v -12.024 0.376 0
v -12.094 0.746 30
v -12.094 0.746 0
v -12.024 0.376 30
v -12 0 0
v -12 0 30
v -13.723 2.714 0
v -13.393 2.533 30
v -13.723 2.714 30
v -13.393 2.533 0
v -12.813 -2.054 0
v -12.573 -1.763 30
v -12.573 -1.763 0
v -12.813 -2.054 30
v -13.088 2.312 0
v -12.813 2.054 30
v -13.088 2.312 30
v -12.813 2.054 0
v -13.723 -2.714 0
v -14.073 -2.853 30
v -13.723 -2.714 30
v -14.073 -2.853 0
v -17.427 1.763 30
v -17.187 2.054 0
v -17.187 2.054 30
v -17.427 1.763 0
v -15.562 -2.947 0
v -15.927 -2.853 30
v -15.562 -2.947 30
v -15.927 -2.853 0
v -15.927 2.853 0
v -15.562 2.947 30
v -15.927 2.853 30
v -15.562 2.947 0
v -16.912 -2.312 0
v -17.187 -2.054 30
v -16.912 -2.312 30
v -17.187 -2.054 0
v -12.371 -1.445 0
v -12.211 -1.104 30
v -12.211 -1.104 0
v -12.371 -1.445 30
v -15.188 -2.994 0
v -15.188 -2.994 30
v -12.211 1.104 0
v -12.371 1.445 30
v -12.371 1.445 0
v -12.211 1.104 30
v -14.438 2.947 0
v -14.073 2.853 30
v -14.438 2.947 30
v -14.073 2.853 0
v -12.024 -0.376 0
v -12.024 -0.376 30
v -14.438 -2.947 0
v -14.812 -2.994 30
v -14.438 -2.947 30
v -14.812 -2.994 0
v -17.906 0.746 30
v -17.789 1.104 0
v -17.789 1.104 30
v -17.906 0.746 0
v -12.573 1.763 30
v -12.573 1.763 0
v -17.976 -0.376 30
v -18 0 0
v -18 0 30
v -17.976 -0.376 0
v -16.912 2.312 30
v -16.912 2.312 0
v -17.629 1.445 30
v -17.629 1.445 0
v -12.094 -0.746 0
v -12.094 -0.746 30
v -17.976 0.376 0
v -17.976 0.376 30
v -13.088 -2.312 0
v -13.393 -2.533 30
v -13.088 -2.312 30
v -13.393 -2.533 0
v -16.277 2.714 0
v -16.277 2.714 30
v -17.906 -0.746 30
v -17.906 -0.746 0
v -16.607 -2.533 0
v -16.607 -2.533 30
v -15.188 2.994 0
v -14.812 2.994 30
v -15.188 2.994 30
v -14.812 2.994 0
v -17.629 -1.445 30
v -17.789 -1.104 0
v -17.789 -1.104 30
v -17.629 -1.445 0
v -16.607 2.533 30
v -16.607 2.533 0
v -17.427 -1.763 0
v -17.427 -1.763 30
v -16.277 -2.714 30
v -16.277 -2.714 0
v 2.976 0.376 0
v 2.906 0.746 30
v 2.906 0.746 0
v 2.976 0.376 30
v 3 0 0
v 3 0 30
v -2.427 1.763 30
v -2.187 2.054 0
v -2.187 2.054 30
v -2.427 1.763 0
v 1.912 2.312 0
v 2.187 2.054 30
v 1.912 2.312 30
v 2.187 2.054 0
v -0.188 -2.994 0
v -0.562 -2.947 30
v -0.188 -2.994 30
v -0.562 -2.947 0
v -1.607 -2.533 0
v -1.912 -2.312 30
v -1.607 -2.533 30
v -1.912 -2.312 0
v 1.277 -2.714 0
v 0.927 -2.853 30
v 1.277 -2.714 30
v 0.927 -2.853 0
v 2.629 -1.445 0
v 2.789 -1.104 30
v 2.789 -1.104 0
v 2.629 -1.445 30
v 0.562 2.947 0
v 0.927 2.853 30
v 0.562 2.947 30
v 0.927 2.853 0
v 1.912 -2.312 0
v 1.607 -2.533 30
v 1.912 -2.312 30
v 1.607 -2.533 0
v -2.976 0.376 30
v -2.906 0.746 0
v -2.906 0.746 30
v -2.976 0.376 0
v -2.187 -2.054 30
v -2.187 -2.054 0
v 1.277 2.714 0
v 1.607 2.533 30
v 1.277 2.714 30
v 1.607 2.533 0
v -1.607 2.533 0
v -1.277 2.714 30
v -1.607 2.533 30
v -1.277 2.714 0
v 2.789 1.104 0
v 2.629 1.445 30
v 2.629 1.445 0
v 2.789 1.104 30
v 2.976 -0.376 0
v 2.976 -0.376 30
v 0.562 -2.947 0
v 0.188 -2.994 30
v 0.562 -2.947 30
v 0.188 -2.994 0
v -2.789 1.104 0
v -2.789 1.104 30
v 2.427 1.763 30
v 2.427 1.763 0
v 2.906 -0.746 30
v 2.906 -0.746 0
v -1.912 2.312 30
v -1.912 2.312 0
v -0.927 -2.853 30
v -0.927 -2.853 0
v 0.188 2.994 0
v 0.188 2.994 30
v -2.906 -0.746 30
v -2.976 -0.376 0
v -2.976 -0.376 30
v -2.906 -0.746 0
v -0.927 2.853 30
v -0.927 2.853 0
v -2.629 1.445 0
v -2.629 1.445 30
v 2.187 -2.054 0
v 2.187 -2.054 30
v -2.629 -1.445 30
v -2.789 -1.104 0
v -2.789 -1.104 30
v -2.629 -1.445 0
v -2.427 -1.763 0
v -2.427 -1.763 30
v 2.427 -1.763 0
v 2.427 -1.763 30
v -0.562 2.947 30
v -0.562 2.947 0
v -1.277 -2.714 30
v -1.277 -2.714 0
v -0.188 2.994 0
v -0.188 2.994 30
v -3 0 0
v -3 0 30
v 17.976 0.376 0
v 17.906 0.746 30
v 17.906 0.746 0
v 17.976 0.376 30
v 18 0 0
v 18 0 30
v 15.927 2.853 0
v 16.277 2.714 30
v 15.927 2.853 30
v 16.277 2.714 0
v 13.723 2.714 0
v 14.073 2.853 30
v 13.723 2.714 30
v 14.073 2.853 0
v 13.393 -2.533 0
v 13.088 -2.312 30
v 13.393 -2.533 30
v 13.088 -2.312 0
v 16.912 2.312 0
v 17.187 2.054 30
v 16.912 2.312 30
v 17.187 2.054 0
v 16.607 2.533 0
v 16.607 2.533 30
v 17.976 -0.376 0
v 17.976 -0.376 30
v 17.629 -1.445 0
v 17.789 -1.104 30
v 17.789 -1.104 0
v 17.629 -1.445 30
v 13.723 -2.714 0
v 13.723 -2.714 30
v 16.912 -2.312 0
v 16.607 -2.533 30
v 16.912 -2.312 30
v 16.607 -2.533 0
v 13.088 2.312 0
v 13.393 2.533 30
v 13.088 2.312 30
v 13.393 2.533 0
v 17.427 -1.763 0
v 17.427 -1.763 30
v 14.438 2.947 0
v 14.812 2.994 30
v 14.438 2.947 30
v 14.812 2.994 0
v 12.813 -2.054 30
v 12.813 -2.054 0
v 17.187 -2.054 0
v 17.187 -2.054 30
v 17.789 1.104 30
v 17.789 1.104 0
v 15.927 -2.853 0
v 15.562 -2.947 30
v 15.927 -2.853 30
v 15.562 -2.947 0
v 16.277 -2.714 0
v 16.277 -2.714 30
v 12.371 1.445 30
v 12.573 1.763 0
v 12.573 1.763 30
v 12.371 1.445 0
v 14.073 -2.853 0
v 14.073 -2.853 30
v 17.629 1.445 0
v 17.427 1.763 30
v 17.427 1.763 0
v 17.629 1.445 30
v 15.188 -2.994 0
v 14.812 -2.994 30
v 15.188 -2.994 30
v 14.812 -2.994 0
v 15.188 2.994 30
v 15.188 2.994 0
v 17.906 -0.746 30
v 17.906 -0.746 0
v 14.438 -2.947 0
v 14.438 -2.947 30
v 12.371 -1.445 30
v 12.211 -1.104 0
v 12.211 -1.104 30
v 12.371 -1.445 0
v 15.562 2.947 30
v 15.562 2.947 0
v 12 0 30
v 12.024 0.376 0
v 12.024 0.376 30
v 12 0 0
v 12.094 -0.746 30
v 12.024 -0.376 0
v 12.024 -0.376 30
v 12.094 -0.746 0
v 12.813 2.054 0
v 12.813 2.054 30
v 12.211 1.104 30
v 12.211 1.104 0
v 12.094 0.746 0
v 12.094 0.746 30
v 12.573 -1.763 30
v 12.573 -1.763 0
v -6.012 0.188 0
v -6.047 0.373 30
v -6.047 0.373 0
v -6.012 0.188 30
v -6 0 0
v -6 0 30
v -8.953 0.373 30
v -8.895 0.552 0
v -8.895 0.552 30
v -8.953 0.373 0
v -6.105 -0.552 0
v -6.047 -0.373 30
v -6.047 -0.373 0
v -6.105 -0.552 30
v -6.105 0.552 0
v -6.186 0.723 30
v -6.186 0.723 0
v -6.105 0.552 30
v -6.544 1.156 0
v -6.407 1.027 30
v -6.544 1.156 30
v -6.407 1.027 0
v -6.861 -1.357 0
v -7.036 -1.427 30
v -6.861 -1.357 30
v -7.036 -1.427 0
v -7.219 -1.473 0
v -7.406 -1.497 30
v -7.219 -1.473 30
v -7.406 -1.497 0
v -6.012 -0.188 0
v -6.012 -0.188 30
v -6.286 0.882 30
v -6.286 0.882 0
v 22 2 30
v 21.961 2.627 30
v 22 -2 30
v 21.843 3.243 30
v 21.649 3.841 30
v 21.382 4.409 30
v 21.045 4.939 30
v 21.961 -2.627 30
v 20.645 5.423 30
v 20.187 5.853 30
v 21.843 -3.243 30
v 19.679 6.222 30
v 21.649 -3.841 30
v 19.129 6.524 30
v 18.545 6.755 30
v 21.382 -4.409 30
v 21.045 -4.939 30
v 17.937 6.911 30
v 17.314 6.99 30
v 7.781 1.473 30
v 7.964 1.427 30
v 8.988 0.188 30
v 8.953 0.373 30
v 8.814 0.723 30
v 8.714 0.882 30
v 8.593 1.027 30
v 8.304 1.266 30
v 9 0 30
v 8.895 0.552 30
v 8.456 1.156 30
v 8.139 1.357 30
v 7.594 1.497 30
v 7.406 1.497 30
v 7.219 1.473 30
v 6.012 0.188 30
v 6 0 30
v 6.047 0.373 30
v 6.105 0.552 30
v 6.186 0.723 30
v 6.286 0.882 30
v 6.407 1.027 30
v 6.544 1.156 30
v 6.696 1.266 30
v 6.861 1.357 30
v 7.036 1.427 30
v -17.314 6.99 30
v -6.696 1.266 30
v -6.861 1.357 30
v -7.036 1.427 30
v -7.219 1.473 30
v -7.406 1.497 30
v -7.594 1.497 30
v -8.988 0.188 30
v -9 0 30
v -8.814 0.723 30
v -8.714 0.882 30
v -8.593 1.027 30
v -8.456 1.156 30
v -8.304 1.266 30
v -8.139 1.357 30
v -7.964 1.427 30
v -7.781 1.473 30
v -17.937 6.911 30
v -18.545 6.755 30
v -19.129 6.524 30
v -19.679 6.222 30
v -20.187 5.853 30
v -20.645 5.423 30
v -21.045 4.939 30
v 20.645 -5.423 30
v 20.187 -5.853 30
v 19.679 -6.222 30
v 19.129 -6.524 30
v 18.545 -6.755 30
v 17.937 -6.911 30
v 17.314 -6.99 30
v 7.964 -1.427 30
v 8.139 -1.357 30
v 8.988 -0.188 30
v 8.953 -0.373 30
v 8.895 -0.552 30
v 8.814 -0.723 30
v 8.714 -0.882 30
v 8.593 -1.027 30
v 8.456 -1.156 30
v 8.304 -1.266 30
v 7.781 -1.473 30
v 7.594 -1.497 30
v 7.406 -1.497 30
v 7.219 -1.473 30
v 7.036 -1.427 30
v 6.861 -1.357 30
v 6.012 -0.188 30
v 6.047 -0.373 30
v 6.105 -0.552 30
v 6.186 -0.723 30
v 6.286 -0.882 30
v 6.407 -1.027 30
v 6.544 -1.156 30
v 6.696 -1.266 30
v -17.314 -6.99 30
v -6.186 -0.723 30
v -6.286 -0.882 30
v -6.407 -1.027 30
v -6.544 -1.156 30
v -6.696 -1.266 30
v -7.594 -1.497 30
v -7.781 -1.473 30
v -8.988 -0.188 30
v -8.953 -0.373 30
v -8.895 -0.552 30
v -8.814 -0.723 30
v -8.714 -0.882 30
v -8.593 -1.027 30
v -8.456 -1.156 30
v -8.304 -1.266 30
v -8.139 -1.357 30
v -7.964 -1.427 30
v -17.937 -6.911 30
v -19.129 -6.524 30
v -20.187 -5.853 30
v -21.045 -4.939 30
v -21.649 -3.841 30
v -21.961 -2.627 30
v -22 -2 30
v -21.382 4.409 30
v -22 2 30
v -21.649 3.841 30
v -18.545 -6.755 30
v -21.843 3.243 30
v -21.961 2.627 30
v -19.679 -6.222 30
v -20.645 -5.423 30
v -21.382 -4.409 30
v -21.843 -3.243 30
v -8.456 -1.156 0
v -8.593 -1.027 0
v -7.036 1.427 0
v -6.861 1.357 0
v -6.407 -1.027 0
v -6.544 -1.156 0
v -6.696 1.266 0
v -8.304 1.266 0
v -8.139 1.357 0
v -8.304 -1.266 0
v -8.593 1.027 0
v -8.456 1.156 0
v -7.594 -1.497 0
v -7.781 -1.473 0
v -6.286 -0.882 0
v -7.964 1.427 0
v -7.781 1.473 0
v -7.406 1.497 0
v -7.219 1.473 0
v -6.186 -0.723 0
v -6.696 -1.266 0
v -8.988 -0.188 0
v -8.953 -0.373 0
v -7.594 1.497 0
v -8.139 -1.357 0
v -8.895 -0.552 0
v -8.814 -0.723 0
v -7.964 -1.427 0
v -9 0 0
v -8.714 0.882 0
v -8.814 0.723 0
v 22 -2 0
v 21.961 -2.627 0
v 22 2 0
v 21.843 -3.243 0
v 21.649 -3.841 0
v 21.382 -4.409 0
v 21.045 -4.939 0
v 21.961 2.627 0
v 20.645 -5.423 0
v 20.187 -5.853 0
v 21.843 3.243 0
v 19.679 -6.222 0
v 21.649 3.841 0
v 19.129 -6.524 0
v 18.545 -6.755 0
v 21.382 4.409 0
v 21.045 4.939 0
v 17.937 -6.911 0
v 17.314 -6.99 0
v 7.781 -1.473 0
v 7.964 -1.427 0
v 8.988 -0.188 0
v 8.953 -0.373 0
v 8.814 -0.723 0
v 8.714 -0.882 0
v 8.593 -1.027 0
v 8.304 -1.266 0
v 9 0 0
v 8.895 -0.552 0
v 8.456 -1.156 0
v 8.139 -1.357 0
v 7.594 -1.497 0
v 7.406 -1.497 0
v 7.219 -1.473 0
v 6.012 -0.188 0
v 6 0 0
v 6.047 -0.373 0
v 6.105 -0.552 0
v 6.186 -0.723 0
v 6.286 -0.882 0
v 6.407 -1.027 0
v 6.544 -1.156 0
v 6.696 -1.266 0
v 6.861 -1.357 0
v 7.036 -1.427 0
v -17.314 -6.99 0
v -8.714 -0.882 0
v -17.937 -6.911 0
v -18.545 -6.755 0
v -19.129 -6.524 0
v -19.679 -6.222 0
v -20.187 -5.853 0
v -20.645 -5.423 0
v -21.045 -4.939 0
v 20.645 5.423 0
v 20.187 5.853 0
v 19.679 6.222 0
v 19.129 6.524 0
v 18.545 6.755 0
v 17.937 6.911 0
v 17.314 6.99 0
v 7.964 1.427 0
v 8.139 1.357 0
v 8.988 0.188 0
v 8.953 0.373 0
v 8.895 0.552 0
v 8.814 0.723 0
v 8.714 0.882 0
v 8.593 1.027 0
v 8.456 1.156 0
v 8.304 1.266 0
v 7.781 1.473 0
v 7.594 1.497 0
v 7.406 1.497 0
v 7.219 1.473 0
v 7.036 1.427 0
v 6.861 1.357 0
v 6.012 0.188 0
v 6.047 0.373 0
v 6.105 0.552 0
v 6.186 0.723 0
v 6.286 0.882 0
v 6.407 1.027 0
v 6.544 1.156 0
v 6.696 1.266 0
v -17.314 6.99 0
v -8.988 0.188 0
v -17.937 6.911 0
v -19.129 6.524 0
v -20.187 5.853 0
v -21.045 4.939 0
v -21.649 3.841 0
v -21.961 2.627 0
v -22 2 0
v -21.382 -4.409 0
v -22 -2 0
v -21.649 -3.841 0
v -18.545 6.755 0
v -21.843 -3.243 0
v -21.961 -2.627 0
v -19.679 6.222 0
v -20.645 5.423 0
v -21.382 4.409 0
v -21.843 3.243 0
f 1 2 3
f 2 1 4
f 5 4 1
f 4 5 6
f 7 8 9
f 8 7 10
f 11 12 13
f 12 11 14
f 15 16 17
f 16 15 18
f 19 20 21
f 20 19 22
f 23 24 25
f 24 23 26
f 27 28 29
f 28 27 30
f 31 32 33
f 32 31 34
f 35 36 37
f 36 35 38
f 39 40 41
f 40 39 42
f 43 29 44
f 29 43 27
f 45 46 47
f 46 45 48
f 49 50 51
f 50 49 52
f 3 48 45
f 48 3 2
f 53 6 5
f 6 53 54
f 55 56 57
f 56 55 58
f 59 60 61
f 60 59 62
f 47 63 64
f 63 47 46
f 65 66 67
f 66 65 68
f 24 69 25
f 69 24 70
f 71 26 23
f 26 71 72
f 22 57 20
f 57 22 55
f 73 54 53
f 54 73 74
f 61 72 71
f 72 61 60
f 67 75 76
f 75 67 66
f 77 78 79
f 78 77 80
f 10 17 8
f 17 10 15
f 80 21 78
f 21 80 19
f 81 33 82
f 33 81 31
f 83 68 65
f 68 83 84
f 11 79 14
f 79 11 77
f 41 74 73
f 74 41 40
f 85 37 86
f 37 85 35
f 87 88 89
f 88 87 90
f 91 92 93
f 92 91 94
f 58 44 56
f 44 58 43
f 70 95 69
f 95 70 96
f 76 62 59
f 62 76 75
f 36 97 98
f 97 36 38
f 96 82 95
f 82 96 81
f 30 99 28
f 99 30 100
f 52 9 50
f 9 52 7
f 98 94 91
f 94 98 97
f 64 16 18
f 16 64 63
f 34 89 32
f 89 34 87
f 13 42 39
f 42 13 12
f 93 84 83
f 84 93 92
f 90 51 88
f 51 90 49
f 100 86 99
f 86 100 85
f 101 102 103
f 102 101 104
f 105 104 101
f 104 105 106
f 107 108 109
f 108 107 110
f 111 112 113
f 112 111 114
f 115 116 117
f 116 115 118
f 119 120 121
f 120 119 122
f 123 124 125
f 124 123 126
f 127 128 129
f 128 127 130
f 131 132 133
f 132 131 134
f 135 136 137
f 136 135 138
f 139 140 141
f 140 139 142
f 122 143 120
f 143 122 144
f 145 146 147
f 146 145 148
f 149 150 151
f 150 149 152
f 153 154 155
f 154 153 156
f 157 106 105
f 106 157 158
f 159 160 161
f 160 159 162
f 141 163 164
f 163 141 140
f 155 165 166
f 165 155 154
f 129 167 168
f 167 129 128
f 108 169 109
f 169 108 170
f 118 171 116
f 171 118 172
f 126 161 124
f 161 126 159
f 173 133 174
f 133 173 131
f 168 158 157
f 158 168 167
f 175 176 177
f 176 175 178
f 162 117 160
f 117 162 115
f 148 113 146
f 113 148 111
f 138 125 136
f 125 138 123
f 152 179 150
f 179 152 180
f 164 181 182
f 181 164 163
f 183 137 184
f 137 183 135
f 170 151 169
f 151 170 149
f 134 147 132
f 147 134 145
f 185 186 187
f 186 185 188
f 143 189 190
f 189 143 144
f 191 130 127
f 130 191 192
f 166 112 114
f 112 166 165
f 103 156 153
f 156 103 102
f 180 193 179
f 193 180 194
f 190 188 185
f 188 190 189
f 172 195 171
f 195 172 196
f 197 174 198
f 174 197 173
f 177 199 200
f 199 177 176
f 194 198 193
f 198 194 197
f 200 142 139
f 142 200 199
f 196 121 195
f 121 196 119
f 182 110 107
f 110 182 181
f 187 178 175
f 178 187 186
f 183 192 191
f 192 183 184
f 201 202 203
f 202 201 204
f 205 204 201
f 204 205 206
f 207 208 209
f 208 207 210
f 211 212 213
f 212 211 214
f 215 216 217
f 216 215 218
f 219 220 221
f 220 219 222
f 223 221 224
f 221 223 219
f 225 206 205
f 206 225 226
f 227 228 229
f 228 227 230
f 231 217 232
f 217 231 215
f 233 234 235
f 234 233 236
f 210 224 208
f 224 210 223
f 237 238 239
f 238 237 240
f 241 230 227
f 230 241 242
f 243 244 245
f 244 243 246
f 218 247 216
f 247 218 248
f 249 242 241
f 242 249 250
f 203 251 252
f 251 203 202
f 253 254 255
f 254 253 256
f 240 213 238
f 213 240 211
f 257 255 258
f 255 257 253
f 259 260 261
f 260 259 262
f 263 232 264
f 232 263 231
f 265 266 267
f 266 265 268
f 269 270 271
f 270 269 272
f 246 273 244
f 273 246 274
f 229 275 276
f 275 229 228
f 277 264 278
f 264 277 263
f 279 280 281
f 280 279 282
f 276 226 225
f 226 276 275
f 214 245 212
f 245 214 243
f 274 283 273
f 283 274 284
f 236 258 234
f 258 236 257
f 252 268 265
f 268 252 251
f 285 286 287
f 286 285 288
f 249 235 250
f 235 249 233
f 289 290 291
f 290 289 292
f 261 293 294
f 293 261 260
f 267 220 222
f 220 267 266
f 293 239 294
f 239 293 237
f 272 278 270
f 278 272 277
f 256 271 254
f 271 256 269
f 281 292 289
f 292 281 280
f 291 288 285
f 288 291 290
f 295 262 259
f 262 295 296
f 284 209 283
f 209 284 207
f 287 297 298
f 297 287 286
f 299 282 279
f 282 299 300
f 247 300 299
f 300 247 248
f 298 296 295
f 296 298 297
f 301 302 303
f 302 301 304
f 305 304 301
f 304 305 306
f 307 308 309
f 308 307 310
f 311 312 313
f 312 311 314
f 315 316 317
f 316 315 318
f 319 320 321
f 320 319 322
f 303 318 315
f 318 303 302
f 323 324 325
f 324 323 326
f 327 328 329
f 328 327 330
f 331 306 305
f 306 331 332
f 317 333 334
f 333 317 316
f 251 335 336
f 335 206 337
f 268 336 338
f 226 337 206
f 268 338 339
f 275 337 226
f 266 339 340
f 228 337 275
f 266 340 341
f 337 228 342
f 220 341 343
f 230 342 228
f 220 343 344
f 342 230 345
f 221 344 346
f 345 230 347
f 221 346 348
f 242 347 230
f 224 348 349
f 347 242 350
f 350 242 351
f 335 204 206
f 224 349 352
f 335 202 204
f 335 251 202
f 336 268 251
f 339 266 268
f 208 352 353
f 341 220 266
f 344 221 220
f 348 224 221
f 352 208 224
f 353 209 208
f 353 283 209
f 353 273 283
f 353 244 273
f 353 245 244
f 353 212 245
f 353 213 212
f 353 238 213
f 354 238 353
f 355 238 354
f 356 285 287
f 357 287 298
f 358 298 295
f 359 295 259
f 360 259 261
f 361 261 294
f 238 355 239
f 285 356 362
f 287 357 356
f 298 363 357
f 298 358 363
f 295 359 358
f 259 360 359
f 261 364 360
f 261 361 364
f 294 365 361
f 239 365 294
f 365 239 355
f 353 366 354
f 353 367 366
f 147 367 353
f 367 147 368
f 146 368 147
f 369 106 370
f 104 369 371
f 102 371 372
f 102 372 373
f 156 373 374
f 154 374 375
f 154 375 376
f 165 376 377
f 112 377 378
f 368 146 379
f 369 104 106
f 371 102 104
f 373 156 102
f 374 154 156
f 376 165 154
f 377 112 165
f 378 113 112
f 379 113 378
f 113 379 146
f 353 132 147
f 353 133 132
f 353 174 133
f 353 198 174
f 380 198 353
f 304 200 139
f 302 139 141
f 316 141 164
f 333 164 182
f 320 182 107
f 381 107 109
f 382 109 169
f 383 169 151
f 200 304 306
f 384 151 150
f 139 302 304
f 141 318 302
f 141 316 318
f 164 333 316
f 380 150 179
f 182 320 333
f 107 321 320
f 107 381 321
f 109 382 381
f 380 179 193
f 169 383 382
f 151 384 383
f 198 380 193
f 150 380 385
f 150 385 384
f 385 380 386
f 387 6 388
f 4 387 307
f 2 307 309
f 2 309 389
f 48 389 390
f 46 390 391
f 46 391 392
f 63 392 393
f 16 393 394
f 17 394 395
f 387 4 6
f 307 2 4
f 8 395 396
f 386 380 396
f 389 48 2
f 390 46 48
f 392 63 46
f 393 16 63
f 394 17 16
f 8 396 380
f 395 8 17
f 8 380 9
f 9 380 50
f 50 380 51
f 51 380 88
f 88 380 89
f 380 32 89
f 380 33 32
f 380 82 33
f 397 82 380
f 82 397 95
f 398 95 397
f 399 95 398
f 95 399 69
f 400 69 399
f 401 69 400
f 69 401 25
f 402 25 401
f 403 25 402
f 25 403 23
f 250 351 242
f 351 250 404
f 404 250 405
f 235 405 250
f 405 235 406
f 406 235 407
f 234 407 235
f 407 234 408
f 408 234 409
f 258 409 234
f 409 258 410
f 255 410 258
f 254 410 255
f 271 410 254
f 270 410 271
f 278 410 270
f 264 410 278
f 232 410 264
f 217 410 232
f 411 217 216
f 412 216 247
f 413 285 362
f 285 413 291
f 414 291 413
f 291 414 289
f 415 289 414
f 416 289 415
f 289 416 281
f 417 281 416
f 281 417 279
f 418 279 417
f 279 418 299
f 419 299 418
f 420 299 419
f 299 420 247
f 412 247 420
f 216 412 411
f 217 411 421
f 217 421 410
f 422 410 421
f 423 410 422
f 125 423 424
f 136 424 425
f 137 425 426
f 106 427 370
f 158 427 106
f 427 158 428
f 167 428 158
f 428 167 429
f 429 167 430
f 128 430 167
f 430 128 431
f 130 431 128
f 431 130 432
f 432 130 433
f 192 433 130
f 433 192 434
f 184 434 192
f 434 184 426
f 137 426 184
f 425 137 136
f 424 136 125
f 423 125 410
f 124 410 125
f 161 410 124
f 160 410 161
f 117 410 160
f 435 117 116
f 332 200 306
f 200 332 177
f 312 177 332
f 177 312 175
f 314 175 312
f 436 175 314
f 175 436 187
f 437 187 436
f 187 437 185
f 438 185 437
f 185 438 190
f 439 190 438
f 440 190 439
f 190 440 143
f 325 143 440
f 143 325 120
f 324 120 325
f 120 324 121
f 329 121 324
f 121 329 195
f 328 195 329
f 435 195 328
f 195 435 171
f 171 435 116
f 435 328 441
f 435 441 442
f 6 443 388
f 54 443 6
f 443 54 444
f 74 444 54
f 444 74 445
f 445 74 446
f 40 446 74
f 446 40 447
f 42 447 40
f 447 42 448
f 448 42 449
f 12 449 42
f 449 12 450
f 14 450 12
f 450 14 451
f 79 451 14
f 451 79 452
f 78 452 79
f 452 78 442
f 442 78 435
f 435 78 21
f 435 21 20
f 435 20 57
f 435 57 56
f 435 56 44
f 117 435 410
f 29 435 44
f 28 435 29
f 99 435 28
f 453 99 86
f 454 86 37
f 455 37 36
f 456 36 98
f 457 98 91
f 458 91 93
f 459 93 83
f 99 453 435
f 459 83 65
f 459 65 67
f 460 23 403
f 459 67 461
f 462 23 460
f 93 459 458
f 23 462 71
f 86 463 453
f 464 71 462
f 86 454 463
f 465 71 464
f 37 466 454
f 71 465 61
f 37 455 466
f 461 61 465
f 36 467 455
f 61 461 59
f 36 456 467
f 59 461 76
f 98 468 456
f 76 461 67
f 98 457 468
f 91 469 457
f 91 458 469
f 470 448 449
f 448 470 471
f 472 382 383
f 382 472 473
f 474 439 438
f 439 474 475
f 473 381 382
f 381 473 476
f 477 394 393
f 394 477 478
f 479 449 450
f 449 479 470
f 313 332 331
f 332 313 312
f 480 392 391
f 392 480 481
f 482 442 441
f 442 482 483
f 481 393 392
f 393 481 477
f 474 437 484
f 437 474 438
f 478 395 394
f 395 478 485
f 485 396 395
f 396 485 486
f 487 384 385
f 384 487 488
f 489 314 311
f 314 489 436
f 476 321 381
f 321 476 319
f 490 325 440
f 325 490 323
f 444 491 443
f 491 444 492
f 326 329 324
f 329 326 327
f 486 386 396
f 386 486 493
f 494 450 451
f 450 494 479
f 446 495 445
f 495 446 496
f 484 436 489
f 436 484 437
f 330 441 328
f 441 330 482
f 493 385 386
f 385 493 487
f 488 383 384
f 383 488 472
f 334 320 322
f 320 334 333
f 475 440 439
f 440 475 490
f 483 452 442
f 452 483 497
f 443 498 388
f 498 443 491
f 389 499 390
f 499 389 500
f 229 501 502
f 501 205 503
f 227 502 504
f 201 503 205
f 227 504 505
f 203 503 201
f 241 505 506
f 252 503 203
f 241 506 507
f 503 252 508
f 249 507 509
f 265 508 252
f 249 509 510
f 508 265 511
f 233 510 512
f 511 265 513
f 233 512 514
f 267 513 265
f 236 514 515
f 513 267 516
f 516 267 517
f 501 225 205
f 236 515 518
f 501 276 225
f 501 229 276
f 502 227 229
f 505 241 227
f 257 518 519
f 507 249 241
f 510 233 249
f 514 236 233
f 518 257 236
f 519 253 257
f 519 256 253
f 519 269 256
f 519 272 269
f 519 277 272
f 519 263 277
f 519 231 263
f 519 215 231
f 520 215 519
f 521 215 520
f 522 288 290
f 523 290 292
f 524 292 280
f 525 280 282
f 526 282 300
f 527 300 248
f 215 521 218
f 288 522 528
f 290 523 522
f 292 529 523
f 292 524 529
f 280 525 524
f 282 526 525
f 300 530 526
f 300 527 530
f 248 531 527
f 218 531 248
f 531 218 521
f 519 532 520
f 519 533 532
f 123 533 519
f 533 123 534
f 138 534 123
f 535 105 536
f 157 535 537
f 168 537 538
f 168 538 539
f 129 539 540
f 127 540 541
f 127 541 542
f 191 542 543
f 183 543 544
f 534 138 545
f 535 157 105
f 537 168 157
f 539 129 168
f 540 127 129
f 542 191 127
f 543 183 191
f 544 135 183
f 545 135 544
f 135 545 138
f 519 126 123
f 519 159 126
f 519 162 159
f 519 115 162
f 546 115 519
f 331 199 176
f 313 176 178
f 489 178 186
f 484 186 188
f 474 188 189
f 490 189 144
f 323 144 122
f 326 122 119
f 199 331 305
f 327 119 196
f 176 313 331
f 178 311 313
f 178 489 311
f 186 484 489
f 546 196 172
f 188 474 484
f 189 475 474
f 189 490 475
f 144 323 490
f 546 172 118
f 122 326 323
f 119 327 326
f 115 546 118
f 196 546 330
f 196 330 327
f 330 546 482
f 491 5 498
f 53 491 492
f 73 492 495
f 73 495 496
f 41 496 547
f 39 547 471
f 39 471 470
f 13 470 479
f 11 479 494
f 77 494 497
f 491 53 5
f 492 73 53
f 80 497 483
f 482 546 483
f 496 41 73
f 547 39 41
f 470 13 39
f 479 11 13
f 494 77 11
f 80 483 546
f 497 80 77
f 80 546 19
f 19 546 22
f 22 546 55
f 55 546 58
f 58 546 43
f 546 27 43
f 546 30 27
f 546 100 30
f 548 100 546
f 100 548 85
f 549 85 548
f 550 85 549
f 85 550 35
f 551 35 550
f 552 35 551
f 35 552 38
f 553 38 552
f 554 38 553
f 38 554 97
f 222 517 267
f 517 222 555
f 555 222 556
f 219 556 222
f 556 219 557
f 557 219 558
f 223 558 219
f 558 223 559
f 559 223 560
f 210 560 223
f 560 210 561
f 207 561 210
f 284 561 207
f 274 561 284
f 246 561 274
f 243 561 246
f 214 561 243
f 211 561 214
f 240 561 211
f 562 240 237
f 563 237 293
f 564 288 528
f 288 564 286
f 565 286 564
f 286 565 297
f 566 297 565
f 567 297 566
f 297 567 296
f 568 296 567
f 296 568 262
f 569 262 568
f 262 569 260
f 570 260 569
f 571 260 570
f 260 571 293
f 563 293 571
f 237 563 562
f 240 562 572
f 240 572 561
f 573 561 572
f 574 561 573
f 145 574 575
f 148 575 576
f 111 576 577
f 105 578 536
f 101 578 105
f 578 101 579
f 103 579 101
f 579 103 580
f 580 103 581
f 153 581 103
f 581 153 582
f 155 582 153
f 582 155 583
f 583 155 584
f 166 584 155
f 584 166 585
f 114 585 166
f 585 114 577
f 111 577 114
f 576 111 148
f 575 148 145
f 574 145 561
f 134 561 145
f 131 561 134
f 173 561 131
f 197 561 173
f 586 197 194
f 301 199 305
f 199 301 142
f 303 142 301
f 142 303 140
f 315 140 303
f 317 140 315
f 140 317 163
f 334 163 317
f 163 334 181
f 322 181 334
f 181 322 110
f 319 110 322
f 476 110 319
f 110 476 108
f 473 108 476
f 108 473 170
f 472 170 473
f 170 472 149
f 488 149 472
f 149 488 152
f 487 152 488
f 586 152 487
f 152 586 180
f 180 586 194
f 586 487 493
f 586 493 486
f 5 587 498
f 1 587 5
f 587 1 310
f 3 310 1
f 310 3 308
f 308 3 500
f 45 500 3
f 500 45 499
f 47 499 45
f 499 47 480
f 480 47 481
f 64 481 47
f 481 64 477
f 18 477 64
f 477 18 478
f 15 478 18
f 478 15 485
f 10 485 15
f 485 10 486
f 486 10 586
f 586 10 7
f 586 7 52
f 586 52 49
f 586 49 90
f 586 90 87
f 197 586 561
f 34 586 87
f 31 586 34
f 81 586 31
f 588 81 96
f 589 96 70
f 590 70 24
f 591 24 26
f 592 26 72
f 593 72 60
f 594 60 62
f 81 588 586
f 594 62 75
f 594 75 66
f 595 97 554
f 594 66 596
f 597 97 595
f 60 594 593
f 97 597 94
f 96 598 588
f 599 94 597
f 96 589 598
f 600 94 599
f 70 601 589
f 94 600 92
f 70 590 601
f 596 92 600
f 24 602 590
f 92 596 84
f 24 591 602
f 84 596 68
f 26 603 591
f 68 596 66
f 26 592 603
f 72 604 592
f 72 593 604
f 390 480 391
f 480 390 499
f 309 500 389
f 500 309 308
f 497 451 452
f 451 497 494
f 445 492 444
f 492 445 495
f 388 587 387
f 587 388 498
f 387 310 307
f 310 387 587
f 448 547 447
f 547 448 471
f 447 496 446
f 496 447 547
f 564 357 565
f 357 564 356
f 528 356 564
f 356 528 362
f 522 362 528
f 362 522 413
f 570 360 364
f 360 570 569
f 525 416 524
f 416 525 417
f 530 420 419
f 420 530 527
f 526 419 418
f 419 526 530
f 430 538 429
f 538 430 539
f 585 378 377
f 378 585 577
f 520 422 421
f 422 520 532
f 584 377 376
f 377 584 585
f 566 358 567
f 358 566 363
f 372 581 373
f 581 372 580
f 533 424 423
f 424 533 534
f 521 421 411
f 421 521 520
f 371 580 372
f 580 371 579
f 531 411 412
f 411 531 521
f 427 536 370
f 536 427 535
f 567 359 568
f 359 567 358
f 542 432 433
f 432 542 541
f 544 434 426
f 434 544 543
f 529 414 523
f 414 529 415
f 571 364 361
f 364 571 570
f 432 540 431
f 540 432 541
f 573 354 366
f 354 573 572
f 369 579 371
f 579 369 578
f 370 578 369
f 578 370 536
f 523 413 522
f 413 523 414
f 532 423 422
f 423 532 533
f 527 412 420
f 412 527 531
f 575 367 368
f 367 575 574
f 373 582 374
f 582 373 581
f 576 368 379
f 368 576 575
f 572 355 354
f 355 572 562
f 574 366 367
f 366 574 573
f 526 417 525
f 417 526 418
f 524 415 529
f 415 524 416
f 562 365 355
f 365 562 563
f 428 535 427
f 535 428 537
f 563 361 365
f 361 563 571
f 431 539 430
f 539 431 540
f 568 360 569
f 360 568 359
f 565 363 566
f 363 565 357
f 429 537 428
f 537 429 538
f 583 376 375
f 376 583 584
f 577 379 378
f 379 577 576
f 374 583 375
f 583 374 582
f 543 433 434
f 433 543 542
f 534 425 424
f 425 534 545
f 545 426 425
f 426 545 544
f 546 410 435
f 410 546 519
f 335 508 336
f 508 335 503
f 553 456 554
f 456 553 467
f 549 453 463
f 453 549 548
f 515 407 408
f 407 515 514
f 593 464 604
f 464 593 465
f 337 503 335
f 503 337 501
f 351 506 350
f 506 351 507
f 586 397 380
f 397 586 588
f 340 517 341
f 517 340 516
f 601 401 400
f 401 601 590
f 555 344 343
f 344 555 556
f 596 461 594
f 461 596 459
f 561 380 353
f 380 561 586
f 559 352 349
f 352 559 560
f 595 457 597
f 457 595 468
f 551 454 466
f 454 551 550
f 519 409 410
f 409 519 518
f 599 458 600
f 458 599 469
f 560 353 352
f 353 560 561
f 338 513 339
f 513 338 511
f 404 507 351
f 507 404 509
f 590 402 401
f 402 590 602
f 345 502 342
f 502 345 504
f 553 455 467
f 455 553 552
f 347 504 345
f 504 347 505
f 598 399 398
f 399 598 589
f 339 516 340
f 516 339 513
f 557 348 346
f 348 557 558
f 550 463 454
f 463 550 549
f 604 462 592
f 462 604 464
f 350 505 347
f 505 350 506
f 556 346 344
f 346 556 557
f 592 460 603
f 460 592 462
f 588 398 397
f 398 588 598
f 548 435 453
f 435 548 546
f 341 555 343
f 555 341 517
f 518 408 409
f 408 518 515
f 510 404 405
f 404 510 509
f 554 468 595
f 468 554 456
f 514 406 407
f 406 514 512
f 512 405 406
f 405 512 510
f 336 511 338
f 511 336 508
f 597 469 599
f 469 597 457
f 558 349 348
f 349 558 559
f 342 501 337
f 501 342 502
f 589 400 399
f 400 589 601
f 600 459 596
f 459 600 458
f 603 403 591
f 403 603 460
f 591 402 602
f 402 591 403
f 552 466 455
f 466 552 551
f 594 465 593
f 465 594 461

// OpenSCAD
$fn = 50;


difference() {
	union() {
		hull() {
			translate(v = [-17.0000000000, 2.0000000000, 0]) {
				cylinder(h = 30, r = 5);
			}
			translate(v = [17.0000000000, 2.0000000000, 0]) {
				cylinder(h = 30, r = 5);
			}
			translate(v = [-17.0000000000, -2.0000000000, 0]) {
				cylinder(h = 30, r = 5);
			}
			translate(v = [17.0000000000, -2.0000000000, 0]) {
				cylinder(h = 30, r = 5);
			}
		}
	}
	union() {
		translate(v = [-15.0000000000, 0.0000000000, -100.0000000000]) {
			cylinder(h = 200, r = 3.0000000000);
		}
		translate(v = [0.0000000000, 0.0000000000, -100.0000000000]) {
			cylinder(h = 200, r = 3.0000000000);
		}
		translate(v = [15.0000000000, 0.0000000000, -100.0000000000]) {
			cylinder(h = 200, r = 3.0000000000);
		}
		translate(v = [-15.0000000000, 0.0000000000, 0]) {
			cylinder(h = 30, r = 1.5000000000);
		}
		translate(v = [-7.5000000000, 0.0000000000, 0]) {
			cylinder(h = 30, r = 1.5000000000);
		}
		cylinder(h = 30, r = 1.5000000000);
		translate(v = [7.5000000000, 0.0000000000, 0]) {
			cylinder(h = 30, r = 1.5000000000);
		}
		translate(v = [15.0000000000, 0.0000000000, 0]) {
			cylinder(h = 30, r = 1.5000000000);
		}
		translate(v = [-15.0000000000, 0.0000000000, 0]) {
			cylinder(h = 30, r = 1.5000000000);
		}
		translate(v = [-7.5000000000, 0.0000000000, 0]) {
			cylinder(h = 30, r = 1.5000000000);
		}
		cylinder(h = 30, r = 1.5000000000);
		translate(v = [7.5000000000, 0.0000000000, 0]) {
			cylinder(h = 30, r = 1.5000000000);
		}
		translate(v = [15.0000000000, 0.0000000000, 0]) {
			cylinder(h = 30, r = 1.5000000000);
		}
		translate(v = [-15.0000000000, 0.0000000000, 0]) {
			cylinder(h = 30, r = 1.5000000000);
		}
		translate(v = [-7.5000000000, 0.0000000000, 0]) {
			cylinder(h = 30, r = 1.5000000000);
		}
		cylinder(h = 30, r = 1.5000000000);
		translate(v = [7.5000000000, 0.0000000000, 0]) {
			cylinder(h = 30, r = 1.5000000000);
		}
		translate(v = [15.0000000000, 0.0000000000, 0]) {
			cylinder(h = 30, r = 1.5000000000);
		}
	}
}
